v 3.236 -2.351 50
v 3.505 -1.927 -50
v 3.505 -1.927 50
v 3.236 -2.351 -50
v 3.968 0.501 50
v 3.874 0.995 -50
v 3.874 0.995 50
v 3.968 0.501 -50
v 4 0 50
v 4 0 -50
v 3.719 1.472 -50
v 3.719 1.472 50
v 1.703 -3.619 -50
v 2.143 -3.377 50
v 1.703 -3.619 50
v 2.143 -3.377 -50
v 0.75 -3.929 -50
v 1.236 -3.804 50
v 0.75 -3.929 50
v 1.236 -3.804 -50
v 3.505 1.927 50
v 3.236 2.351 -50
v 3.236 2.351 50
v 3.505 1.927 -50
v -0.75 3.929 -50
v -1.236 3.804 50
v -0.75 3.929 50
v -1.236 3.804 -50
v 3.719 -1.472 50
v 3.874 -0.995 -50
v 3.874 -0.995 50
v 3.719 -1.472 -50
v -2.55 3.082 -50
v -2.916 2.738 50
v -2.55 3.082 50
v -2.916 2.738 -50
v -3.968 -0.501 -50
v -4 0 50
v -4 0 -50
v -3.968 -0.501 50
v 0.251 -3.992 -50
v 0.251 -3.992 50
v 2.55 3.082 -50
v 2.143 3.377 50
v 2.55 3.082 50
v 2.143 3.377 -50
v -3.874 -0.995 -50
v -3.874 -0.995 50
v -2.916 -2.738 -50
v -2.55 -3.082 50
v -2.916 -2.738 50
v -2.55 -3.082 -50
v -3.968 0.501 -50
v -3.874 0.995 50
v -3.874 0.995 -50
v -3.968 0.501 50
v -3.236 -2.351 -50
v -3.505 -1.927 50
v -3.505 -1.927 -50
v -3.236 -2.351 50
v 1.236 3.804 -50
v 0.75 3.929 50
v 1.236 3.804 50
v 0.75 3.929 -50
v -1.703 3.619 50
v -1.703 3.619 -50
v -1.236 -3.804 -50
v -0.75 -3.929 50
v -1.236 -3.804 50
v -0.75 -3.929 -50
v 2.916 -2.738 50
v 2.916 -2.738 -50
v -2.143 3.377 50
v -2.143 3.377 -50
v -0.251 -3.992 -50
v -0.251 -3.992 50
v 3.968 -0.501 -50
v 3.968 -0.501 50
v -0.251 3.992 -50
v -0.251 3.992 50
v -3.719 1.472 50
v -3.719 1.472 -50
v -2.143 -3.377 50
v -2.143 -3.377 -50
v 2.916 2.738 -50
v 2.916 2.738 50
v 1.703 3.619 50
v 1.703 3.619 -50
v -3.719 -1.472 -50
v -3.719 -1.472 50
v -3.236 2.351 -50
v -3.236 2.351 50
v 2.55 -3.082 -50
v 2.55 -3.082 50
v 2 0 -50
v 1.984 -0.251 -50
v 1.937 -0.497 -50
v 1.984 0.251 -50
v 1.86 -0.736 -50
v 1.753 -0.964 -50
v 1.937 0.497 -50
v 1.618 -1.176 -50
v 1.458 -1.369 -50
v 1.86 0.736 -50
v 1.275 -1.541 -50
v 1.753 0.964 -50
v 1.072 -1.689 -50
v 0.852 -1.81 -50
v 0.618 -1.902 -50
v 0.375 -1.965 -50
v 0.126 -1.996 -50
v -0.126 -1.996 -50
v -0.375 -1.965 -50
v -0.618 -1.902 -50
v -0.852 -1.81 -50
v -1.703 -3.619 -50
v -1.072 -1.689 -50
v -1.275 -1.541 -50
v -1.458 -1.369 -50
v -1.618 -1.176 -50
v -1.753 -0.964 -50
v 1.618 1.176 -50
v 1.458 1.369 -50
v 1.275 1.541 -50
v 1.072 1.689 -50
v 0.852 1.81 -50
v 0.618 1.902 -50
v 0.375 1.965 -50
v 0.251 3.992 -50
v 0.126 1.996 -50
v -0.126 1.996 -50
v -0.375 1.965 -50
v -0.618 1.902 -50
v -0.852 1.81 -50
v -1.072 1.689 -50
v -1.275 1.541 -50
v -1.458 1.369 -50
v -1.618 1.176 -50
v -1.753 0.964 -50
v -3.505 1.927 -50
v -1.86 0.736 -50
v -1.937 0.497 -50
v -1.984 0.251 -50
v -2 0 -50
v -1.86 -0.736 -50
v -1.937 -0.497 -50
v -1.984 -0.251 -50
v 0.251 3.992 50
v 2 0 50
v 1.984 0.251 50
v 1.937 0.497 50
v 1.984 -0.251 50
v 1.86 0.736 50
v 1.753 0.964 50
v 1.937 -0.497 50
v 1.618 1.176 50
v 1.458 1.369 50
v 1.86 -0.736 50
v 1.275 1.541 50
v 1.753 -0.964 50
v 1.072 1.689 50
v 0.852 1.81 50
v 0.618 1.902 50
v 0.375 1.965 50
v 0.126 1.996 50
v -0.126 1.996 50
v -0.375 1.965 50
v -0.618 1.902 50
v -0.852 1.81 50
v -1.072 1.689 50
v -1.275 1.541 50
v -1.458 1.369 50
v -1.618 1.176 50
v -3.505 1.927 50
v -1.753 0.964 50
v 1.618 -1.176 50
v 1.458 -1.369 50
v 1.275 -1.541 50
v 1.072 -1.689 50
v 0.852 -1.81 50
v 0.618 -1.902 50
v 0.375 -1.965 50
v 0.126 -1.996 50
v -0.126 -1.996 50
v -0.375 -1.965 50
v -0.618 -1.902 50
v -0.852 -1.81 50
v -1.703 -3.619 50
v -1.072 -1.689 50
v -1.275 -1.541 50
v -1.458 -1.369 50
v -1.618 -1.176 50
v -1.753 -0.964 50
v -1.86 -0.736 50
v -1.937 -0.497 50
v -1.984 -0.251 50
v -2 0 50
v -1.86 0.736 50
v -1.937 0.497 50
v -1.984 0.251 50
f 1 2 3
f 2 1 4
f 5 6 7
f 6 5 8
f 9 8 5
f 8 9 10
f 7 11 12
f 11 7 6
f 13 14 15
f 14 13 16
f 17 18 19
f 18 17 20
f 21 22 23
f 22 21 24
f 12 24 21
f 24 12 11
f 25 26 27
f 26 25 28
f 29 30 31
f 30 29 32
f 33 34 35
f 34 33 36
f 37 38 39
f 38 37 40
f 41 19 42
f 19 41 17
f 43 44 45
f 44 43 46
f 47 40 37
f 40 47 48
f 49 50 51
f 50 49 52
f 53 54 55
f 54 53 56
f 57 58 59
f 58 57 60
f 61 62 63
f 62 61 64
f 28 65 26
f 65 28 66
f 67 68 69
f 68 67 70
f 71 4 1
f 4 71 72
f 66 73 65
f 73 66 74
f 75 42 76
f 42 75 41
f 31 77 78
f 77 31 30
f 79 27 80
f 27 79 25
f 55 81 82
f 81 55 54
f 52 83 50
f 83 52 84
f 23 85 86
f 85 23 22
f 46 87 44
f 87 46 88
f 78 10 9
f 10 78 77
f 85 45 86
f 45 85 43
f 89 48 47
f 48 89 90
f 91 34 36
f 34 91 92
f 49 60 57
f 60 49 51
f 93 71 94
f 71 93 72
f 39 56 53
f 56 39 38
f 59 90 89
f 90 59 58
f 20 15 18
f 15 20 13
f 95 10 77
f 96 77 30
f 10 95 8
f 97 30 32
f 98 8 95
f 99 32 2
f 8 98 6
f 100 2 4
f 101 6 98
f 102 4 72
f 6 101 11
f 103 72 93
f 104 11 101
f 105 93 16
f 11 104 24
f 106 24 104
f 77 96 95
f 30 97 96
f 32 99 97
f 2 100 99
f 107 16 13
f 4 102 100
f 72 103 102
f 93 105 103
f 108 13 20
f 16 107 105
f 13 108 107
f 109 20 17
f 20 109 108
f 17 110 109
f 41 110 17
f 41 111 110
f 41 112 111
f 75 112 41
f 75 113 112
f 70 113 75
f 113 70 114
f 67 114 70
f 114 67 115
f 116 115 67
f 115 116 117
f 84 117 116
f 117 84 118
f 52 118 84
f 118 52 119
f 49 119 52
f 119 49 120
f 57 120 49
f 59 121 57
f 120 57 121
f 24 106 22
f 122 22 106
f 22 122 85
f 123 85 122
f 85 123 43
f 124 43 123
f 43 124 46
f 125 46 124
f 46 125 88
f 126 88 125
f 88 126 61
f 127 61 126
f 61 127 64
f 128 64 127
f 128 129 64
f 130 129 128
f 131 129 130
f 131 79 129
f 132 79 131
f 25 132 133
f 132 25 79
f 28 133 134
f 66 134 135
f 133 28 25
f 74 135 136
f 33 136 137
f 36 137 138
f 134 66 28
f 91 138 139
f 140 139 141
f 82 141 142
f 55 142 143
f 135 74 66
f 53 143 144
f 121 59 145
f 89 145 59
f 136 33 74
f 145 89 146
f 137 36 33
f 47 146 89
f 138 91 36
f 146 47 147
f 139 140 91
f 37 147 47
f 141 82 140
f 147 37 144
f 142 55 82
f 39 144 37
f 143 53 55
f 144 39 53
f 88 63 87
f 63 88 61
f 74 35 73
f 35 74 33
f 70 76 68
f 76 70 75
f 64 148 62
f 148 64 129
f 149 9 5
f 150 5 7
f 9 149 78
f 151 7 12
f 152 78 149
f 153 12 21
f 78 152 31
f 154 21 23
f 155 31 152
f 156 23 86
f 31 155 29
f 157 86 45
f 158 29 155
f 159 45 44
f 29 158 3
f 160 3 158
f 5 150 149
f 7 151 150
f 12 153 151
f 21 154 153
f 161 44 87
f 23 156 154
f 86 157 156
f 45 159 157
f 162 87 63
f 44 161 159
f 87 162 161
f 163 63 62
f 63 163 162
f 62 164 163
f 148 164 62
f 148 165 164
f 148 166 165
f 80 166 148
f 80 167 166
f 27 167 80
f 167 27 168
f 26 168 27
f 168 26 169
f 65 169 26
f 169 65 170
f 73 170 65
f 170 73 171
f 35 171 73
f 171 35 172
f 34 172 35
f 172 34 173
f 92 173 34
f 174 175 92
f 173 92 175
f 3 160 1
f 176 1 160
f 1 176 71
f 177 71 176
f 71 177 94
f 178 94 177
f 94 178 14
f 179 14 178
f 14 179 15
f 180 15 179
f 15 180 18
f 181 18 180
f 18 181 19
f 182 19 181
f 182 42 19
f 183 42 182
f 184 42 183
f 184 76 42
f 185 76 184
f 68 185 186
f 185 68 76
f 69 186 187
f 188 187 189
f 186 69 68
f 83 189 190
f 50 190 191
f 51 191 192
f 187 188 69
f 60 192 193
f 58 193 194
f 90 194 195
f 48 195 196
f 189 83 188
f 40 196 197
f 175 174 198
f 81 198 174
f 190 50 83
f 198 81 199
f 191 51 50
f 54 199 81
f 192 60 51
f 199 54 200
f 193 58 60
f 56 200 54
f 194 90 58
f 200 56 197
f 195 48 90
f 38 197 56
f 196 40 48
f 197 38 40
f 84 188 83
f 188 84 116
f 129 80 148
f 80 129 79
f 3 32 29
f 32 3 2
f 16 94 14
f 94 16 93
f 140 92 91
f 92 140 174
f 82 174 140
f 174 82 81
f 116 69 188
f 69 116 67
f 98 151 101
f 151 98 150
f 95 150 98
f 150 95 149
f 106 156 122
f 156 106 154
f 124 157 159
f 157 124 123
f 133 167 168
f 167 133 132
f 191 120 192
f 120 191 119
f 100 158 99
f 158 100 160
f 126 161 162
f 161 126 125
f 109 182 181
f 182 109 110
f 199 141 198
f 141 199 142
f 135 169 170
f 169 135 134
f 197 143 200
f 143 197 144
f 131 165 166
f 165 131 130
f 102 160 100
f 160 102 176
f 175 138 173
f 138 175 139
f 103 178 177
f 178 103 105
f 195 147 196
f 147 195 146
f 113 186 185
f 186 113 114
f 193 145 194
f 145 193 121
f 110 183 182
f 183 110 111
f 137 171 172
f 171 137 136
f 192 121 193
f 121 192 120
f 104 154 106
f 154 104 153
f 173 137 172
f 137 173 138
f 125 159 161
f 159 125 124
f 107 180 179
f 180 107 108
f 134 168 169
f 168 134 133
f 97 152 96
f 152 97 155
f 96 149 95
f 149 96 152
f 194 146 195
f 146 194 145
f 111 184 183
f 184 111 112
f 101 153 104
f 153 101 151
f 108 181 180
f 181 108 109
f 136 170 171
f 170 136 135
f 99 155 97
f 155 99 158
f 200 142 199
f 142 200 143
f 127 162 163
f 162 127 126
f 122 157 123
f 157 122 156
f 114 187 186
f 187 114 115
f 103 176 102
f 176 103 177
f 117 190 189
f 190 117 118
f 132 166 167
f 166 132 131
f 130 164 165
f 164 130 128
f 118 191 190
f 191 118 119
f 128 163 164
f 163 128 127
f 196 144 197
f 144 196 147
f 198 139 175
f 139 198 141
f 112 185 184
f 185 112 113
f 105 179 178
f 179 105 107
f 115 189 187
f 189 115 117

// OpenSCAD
$fn = 50;


difference() {
	union() {
		translate(v = [0, 0, -50.0000000000]) {
			cylinder(h = 100, r = 4.0000000000);
		}
	}
	union() {
		translate(v = [0, 0, -100.0000000000]) {
			cylinder(h = 200, r = 2.0000000000);
		}
	}
}
